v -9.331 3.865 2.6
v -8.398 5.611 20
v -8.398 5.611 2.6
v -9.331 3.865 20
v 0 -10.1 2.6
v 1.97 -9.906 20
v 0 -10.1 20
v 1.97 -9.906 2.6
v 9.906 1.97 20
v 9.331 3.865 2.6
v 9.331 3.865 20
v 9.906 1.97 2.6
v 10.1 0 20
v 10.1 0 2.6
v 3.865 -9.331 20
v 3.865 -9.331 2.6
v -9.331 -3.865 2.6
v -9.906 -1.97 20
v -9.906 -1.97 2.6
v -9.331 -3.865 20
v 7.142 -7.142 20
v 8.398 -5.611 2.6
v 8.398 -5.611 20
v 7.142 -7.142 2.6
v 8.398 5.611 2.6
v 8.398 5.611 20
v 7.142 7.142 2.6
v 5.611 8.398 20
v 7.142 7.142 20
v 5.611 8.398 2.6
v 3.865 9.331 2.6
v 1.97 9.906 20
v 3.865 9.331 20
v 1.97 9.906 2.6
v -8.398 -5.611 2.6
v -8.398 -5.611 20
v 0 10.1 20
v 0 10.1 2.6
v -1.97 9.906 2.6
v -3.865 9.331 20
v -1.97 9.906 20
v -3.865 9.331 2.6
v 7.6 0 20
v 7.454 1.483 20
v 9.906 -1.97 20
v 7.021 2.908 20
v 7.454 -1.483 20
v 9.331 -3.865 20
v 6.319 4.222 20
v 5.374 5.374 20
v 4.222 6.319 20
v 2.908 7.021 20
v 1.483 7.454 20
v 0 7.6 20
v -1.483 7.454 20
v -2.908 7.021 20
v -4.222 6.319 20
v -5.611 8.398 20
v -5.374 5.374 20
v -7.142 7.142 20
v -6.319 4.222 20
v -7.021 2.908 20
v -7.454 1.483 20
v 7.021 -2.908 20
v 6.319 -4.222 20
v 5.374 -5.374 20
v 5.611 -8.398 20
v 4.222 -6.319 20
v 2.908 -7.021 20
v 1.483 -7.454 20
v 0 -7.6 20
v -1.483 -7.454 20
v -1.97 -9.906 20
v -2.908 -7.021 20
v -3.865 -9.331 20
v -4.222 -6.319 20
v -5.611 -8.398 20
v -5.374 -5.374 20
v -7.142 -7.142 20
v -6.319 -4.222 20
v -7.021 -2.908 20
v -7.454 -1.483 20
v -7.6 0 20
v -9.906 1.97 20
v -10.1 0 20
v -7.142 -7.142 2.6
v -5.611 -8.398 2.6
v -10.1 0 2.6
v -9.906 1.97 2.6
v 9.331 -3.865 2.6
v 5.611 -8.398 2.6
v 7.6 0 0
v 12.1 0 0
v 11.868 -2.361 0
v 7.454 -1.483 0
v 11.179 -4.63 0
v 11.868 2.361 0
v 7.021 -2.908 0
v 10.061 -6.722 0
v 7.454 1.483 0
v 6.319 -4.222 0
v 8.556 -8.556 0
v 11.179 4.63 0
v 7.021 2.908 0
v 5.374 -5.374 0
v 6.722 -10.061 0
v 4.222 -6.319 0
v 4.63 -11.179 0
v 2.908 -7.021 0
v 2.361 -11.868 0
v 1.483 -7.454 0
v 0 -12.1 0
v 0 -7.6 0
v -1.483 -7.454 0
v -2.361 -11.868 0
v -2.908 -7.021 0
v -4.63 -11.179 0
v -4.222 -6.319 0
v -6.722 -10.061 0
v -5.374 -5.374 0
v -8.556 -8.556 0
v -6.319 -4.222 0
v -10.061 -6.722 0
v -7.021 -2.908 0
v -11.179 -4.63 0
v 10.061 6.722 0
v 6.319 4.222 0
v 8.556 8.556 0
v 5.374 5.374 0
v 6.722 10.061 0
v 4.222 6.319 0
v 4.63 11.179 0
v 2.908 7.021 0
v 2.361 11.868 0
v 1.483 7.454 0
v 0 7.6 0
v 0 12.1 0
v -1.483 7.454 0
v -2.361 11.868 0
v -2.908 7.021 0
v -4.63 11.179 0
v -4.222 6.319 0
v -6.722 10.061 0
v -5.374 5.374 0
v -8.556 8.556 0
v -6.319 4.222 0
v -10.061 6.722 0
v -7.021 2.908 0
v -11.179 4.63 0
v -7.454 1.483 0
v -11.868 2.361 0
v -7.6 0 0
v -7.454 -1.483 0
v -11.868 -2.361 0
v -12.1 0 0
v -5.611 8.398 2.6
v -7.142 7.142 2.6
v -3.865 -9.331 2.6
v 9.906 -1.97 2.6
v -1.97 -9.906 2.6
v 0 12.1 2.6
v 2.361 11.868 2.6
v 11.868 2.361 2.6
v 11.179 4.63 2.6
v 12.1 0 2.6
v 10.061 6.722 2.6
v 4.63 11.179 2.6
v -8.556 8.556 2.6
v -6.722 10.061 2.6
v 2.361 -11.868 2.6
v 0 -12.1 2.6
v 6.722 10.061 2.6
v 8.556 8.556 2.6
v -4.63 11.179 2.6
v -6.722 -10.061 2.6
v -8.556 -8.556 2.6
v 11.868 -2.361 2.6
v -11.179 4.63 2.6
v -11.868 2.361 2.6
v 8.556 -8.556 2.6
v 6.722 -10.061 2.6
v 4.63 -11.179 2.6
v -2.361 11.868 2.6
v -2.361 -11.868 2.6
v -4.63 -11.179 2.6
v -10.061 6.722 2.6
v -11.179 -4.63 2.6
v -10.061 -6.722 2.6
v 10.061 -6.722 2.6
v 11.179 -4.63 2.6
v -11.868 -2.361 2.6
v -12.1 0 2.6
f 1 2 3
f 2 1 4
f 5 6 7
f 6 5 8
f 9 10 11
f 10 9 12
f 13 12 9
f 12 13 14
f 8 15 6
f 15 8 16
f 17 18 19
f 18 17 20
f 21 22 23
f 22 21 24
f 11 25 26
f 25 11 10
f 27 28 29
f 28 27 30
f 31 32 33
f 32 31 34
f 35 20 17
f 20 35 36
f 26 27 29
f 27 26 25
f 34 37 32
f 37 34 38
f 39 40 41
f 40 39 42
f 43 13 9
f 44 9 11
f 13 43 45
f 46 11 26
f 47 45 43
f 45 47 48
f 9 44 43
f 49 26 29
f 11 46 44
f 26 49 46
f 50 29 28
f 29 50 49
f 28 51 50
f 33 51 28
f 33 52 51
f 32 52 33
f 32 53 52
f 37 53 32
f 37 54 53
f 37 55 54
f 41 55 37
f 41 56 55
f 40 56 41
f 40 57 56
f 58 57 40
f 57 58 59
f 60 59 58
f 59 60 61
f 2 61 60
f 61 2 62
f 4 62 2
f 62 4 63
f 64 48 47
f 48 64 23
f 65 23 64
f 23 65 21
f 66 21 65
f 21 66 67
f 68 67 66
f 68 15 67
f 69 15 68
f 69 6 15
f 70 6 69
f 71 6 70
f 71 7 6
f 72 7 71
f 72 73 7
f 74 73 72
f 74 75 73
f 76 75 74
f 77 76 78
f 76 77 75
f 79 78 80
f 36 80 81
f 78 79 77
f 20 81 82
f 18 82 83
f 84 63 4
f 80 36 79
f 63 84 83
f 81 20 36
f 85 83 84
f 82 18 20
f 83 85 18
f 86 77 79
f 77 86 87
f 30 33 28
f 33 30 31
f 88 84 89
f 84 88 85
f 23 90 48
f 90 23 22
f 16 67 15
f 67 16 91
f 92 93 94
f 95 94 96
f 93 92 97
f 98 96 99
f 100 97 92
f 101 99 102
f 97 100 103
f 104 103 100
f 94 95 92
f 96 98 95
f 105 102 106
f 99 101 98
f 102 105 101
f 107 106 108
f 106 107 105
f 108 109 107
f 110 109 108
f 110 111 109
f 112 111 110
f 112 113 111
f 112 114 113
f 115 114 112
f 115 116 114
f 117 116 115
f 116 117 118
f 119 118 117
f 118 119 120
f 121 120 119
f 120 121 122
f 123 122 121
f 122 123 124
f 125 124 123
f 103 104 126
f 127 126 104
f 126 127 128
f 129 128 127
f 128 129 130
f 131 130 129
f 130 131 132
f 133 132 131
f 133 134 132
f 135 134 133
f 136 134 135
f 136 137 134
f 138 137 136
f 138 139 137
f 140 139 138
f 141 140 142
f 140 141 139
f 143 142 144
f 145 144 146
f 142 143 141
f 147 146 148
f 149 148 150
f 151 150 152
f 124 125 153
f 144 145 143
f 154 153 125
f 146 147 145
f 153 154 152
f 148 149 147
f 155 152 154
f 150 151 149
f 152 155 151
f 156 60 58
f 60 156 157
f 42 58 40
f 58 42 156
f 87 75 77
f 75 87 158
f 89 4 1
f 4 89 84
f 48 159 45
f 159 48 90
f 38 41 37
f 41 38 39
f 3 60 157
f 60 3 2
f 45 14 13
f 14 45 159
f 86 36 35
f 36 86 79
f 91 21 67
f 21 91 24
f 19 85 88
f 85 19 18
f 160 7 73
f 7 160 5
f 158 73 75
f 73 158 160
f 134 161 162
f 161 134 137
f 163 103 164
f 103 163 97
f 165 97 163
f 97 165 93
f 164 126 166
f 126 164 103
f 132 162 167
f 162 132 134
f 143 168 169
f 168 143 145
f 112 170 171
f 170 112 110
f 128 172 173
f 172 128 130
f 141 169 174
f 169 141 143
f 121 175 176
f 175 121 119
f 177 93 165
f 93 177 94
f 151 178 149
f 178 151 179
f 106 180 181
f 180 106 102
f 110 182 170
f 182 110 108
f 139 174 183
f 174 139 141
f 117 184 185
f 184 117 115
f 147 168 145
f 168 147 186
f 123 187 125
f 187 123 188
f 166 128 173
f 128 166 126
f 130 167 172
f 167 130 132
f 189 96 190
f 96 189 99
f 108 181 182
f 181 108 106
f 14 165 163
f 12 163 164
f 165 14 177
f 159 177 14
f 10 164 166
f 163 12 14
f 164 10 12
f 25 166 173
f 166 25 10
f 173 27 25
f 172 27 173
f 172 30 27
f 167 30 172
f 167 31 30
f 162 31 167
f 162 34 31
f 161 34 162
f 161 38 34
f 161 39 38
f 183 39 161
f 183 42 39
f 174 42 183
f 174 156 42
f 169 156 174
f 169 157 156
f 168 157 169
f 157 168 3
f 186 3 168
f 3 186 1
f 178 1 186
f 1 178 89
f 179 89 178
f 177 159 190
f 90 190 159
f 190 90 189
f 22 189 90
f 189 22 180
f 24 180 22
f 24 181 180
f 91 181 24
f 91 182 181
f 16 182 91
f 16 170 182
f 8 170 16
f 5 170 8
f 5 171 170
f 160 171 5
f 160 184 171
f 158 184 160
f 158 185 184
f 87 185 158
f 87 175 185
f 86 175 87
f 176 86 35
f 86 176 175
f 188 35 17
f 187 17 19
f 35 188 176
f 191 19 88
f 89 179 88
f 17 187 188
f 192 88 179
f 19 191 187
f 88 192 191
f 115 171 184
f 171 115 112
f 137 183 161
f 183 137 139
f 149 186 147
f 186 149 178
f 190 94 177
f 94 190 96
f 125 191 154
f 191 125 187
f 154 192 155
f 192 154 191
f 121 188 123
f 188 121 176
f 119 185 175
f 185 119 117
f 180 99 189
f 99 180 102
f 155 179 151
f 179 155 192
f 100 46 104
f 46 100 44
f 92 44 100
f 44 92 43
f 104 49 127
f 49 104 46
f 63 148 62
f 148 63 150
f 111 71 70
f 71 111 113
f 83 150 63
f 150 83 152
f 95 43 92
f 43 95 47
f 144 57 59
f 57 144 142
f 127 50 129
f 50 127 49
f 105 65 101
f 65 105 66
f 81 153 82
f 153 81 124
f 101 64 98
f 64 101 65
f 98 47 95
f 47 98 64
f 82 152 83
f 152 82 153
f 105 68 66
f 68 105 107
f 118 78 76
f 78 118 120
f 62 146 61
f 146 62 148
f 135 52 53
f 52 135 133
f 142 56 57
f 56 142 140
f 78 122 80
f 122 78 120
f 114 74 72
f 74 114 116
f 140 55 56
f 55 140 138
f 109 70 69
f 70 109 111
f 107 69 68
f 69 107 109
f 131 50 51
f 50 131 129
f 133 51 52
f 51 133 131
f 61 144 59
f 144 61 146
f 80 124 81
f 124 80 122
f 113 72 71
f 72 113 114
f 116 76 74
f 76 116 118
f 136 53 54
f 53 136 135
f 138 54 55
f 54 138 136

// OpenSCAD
$fn = 32;

// ----------------------------------------------------------------------
// Spacer sleeve: 20.2 / 15.2 x 20 mm
// ----------------------------------------------------------------------

// --- parameters (mm) ---
sleeve_od = 20.2;         // outside diameter
sleeve_id = 15.2;         // shaft bore
sleeve_l = 20;            // sleeve length
flange_d = 24.2;          // collar diameter
flange_t = 2;             // collar thickness

module sleeve() {
  cylinder(h = sleeve_l, d = sleeve_od);
  cylinder(h = flange_t + 0.6, d = flange_d);
}

difference() {
  sleeve();
  translate([0, 0, -1]) cylinder(h = sleeve_l + 2, d = sleeve_id);
}
